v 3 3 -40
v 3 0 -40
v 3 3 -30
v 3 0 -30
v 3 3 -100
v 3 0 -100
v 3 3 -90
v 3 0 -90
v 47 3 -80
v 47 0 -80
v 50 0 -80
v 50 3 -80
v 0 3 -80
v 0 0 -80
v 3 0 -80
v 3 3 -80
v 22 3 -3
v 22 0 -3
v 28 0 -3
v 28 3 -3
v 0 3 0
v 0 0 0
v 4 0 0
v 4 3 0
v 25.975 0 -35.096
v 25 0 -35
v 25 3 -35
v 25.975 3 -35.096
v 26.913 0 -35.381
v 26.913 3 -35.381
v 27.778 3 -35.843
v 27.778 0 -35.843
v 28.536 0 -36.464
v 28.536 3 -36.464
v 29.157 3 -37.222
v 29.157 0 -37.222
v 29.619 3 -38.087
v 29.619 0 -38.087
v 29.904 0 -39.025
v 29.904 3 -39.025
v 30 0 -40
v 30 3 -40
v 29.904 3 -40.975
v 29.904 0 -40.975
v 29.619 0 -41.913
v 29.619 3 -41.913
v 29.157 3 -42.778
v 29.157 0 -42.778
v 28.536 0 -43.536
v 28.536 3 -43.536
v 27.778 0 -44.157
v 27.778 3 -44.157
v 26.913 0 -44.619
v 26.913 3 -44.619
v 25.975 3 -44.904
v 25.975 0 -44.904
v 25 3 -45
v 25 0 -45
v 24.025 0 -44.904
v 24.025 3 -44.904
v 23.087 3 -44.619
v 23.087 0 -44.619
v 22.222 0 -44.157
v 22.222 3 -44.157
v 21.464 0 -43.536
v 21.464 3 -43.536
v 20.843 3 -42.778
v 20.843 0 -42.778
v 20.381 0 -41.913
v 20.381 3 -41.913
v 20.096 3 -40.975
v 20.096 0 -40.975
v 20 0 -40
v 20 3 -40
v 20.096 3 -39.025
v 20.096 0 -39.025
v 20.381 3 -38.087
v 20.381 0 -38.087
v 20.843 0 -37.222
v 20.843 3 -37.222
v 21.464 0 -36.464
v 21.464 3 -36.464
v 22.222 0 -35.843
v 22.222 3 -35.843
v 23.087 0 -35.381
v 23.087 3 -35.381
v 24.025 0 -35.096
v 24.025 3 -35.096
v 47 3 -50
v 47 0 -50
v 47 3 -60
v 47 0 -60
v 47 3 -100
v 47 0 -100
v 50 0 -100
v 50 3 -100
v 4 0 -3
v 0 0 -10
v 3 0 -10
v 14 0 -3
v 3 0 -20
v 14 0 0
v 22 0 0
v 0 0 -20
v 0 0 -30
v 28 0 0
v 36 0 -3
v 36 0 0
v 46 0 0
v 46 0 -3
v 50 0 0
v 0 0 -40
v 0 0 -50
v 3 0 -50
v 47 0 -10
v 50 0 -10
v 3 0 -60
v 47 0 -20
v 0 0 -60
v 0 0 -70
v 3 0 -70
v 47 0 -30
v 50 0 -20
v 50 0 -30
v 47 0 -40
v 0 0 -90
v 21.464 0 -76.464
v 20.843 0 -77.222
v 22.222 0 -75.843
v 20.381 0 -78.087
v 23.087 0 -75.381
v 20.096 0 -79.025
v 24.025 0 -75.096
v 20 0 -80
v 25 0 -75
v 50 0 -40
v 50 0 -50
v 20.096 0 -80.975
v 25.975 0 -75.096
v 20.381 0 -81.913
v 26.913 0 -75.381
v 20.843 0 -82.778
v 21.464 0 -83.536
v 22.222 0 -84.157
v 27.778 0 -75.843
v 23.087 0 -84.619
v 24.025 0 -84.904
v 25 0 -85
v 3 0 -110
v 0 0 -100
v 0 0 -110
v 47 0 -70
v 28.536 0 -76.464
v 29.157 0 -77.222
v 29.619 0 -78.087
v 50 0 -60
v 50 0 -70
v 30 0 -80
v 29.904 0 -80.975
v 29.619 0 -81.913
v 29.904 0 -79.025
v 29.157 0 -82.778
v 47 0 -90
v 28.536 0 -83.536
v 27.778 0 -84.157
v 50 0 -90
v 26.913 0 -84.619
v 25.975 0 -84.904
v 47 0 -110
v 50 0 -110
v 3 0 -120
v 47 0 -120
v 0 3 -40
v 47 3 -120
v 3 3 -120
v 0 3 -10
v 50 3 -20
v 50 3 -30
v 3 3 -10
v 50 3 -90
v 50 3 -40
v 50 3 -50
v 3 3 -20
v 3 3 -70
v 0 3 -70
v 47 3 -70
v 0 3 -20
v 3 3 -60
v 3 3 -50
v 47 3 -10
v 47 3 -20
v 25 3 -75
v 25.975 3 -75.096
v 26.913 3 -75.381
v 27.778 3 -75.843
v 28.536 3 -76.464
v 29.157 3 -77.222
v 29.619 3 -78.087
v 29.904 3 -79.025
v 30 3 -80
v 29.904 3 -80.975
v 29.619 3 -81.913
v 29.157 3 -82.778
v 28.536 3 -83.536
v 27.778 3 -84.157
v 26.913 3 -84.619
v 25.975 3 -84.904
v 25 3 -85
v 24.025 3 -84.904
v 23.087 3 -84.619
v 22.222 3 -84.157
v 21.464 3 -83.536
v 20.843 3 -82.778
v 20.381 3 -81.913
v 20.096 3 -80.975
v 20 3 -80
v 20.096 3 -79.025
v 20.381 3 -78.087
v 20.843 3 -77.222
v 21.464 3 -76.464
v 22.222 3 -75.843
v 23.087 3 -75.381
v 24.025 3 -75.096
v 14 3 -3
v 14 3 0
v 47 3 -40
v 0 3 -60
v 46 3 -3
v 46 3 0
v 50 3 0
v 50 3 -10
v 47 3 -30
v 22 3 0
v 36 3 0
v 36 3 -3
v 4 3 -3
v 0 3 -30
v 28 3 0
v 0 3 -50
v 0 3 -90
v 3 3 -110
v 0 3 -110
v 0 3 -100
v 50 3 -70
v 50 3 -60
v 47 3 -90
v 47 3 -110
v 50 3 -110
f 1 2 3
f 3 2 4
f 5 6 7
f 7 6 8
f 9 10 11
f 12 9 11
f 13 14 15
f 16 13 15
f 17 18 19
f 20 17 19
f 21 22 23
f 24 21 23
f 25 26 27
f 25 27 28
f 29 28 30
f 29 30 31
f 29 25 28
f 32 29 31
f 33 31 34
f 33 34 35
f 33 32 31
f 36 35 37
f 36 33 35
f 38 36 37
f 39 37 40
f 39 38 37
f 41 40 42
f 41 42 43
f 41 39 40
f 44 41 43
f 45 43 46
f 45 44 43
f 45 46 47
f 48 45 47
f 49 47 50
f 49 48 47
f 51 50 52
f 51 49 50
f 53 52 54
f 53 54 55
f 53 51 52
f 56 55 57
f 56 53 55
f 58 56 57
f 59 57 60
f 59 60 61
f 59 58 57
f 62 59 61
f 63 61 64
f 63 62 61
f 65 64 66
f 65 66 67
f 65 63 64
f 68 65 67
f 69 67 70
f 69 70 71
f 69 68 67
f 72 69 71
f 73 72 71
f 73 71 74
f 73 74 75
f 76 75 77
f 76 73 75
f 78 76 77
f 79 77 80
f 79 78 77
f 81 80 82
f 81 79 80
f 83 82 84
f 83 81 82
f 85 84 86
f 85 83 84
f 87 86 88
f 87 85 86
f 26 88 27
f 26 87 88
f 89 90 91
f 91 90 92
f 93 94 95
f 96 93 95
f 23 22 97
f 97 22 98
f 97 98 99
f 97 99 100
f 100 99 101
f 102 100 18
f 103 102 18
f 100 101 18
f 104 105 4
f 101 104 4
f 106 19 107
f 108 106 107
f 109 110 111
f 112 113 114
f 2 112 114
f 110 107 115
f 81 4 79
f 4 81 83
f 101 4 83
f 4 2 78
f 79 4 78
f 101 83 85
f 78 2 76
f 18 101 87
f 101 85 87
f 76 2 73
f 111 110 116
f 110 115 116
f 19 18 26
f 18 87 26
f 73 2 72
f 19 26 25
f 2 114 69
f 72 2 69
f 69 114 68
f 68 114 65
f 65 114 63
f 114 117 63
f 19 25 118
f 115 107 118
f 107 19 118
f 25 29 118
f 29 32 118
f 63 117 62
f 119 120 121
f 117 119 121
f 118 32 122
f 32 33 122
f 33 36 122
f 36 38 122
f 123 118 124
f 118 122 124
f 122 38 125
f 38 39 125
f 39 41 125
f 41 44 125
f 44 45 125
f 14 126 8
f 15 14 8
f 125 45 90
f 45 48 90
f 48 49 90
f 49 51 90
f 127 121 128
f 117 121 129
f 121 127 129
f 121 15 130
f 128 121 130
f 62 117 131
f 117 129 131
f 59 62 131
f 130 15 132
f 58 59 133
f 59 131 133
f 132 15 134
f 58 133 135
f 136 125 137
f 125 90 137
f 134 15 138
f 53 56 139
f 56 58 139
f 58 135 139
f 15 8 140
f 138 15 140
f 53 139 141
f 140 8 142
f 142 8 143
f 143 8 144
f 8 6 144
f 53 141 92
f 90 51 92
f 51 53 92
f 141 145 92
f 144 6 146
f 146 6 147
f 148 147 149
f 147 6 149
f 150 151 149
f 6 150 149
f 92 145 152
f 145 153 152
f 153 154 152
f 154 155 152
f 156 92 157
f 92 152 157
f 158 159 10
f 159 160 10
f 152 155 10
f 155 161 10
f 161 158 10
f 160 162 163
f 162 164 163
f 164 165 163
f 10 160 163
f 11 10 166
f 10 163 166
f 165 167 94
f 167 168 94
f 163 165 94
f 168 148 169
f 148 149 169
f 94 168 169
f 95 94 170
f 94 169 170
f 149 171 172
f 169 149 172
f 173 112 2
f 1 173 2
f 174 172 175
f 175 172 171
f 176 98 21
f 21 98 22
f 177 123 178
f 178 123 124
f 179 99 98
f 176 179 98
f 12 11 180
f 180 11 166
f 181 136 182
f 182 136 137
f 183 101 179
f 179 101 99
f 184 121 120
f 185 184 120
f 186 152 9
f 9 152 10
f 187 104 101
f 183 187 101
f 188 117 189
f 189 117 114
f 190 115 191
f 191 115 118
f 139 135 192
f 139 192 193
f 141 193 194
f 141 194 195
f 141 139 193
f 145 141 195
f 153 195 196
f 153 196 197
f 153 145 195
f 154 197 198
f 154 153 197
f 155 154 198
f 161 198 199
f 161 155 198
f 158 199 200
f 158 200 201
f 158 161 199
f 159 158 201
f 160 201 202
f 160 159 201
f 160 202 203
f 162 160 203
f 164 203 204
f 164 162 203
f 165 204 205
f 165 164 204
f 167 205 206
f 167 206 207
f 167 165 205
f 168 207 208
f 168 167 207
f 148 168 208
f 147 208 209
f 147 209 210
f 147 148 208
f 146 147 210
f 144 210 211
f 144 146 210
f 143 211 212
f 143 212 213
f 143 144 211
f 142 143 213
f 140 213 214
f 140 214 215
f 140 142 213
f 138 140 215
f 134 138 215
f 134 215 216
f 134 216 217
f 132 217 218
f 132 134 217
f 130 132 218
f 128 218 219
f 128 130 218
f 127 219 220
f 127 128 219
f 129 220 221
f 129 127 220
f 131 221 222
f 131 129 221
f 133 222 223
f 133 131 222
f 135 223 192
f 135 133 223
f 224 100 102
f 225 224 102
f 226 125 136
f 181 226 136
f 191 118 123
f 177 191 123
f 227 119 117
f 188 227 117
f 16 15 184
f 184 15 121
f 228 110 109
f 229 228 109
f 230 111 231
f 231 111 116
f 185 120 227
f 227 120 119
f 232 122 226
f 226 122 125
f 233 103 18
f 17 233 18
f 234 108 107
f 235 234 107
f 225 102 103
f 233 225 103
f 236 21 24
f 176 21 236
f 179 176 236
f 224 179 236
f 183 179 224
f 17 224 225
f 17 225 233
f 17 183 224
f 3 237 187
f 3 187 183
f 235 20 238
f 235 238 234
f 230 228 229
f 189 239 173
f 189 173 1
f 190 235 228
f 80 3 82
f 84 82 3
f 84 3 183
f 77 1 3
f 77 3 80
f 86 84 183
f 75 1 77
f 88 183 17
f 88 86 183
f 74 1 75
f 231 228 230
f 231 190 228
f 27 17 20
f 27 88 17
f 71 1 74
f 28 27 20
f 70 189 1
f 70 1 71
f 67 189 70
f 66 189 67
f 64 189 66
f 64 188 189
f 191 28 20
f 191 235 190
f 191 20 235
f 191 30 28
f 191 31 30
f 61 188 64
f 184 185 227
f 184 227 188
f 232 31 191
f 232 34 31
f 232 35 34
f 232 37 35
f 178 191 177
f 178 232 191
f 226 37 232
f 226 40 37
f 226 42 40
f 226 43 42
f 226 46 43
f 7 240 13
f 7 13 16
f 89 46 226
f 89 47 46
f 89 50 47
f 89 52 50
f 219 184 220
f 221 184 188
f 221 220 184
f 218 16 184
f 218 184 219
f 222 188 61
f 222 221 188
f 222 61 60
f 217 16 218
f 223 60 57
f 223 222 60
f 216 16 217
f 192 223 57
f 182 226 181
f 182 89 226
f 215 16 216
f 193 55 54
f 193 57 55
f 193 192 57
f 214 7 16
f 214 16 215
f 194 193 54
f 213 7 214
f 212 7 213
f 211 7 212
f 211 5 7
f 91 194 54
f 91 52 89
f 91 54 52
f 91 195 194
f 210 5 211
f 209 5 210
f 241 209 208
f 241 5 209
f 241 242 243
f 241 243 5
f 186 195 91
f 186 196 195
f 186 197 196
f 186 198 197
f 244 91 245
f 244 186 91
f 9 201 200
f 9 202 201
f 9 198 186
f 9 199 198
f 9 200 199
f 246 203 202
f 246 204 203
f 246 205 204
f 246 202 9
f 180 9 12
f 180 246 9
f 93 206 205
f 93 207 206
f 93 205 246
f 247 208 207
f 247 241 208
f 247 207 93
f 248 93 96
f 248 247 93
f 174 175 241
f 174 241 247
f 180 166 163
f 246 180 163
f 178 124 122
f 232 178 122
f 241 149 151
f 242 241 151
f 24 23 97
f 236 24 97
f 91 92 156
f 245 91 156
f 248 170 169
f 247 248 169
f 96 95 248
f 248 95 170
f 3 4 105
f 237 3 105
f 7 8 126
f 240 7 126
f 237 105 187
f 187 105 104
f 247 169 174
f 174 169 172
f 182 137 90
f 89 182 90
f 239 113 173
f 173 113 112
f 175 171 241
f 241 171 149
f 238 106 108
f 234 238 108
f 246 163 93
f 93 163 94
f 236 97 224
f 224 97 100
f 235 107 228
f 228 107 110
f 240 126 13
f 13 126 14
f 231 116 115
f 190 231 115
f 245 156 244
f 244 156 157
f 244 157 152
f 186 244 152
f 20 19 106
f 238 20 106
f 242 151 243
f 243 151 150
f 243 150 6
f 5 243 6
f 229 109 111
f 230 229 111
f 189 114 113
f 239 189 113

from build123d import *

# Parameters (mm, degrees)
SKETCH1_R           = 5
BOSS_EXTRUDE1_DEPTH = 3


with BuildPart() as part:
    # Sketch1 → Boss-Extrude1 (new body)
    with BuildSketch(Plane(origin=(0, 0, 0), x_dir=(1, 0, 0), z_dir=(0, 1, 0))):
        Polygon((3, 10), (0, 10), (0, 0), (4, 0), (4, 3), (14, 3), (14, 0), (22, 0), (22, 3), (28, 3), (28, 0), (36, 0), (36, 3), (46, 3), (46, 0), (50, 0), (50, 10), (47, 10), (47, 20), (50, 20), (50, 30), (47, 30), (47, 40), (50, 40), (50, 50), (47, 50), (47, 60), (50, 60), (50, 70), (47, 70), (47, 80), (50, 80), (50, 90), (47, 90), (47, 100), (50, 100), (50, 110), (47, 110), (47, 120), (3, 120), (3, 110), (0, 110), (0, 100), (3, 100), (3, 90), (0, 90), (0, 80), (3, 80), (3, 70), (0, 70), (0, 60), (3, 60), (3, 50), (0, 50), (0, 40), (3, 40), (3, 30), (0, 30), (0, 20), (3, 20), align=None)
        with Locations(Location((25, 40, 0), (0, 0, 270))):
            Circle(SKETCH1_R, mode=Mode.SUBTRACT)
        with Locations(Location((25, 80, 0), (0, 0, 270))):
            Circle(SKETCH1_R, mode=Mode.SUBTRACT)
    extrude(amount=BOSS_EXTRUDE1_DEPTH)


solid = part.part
